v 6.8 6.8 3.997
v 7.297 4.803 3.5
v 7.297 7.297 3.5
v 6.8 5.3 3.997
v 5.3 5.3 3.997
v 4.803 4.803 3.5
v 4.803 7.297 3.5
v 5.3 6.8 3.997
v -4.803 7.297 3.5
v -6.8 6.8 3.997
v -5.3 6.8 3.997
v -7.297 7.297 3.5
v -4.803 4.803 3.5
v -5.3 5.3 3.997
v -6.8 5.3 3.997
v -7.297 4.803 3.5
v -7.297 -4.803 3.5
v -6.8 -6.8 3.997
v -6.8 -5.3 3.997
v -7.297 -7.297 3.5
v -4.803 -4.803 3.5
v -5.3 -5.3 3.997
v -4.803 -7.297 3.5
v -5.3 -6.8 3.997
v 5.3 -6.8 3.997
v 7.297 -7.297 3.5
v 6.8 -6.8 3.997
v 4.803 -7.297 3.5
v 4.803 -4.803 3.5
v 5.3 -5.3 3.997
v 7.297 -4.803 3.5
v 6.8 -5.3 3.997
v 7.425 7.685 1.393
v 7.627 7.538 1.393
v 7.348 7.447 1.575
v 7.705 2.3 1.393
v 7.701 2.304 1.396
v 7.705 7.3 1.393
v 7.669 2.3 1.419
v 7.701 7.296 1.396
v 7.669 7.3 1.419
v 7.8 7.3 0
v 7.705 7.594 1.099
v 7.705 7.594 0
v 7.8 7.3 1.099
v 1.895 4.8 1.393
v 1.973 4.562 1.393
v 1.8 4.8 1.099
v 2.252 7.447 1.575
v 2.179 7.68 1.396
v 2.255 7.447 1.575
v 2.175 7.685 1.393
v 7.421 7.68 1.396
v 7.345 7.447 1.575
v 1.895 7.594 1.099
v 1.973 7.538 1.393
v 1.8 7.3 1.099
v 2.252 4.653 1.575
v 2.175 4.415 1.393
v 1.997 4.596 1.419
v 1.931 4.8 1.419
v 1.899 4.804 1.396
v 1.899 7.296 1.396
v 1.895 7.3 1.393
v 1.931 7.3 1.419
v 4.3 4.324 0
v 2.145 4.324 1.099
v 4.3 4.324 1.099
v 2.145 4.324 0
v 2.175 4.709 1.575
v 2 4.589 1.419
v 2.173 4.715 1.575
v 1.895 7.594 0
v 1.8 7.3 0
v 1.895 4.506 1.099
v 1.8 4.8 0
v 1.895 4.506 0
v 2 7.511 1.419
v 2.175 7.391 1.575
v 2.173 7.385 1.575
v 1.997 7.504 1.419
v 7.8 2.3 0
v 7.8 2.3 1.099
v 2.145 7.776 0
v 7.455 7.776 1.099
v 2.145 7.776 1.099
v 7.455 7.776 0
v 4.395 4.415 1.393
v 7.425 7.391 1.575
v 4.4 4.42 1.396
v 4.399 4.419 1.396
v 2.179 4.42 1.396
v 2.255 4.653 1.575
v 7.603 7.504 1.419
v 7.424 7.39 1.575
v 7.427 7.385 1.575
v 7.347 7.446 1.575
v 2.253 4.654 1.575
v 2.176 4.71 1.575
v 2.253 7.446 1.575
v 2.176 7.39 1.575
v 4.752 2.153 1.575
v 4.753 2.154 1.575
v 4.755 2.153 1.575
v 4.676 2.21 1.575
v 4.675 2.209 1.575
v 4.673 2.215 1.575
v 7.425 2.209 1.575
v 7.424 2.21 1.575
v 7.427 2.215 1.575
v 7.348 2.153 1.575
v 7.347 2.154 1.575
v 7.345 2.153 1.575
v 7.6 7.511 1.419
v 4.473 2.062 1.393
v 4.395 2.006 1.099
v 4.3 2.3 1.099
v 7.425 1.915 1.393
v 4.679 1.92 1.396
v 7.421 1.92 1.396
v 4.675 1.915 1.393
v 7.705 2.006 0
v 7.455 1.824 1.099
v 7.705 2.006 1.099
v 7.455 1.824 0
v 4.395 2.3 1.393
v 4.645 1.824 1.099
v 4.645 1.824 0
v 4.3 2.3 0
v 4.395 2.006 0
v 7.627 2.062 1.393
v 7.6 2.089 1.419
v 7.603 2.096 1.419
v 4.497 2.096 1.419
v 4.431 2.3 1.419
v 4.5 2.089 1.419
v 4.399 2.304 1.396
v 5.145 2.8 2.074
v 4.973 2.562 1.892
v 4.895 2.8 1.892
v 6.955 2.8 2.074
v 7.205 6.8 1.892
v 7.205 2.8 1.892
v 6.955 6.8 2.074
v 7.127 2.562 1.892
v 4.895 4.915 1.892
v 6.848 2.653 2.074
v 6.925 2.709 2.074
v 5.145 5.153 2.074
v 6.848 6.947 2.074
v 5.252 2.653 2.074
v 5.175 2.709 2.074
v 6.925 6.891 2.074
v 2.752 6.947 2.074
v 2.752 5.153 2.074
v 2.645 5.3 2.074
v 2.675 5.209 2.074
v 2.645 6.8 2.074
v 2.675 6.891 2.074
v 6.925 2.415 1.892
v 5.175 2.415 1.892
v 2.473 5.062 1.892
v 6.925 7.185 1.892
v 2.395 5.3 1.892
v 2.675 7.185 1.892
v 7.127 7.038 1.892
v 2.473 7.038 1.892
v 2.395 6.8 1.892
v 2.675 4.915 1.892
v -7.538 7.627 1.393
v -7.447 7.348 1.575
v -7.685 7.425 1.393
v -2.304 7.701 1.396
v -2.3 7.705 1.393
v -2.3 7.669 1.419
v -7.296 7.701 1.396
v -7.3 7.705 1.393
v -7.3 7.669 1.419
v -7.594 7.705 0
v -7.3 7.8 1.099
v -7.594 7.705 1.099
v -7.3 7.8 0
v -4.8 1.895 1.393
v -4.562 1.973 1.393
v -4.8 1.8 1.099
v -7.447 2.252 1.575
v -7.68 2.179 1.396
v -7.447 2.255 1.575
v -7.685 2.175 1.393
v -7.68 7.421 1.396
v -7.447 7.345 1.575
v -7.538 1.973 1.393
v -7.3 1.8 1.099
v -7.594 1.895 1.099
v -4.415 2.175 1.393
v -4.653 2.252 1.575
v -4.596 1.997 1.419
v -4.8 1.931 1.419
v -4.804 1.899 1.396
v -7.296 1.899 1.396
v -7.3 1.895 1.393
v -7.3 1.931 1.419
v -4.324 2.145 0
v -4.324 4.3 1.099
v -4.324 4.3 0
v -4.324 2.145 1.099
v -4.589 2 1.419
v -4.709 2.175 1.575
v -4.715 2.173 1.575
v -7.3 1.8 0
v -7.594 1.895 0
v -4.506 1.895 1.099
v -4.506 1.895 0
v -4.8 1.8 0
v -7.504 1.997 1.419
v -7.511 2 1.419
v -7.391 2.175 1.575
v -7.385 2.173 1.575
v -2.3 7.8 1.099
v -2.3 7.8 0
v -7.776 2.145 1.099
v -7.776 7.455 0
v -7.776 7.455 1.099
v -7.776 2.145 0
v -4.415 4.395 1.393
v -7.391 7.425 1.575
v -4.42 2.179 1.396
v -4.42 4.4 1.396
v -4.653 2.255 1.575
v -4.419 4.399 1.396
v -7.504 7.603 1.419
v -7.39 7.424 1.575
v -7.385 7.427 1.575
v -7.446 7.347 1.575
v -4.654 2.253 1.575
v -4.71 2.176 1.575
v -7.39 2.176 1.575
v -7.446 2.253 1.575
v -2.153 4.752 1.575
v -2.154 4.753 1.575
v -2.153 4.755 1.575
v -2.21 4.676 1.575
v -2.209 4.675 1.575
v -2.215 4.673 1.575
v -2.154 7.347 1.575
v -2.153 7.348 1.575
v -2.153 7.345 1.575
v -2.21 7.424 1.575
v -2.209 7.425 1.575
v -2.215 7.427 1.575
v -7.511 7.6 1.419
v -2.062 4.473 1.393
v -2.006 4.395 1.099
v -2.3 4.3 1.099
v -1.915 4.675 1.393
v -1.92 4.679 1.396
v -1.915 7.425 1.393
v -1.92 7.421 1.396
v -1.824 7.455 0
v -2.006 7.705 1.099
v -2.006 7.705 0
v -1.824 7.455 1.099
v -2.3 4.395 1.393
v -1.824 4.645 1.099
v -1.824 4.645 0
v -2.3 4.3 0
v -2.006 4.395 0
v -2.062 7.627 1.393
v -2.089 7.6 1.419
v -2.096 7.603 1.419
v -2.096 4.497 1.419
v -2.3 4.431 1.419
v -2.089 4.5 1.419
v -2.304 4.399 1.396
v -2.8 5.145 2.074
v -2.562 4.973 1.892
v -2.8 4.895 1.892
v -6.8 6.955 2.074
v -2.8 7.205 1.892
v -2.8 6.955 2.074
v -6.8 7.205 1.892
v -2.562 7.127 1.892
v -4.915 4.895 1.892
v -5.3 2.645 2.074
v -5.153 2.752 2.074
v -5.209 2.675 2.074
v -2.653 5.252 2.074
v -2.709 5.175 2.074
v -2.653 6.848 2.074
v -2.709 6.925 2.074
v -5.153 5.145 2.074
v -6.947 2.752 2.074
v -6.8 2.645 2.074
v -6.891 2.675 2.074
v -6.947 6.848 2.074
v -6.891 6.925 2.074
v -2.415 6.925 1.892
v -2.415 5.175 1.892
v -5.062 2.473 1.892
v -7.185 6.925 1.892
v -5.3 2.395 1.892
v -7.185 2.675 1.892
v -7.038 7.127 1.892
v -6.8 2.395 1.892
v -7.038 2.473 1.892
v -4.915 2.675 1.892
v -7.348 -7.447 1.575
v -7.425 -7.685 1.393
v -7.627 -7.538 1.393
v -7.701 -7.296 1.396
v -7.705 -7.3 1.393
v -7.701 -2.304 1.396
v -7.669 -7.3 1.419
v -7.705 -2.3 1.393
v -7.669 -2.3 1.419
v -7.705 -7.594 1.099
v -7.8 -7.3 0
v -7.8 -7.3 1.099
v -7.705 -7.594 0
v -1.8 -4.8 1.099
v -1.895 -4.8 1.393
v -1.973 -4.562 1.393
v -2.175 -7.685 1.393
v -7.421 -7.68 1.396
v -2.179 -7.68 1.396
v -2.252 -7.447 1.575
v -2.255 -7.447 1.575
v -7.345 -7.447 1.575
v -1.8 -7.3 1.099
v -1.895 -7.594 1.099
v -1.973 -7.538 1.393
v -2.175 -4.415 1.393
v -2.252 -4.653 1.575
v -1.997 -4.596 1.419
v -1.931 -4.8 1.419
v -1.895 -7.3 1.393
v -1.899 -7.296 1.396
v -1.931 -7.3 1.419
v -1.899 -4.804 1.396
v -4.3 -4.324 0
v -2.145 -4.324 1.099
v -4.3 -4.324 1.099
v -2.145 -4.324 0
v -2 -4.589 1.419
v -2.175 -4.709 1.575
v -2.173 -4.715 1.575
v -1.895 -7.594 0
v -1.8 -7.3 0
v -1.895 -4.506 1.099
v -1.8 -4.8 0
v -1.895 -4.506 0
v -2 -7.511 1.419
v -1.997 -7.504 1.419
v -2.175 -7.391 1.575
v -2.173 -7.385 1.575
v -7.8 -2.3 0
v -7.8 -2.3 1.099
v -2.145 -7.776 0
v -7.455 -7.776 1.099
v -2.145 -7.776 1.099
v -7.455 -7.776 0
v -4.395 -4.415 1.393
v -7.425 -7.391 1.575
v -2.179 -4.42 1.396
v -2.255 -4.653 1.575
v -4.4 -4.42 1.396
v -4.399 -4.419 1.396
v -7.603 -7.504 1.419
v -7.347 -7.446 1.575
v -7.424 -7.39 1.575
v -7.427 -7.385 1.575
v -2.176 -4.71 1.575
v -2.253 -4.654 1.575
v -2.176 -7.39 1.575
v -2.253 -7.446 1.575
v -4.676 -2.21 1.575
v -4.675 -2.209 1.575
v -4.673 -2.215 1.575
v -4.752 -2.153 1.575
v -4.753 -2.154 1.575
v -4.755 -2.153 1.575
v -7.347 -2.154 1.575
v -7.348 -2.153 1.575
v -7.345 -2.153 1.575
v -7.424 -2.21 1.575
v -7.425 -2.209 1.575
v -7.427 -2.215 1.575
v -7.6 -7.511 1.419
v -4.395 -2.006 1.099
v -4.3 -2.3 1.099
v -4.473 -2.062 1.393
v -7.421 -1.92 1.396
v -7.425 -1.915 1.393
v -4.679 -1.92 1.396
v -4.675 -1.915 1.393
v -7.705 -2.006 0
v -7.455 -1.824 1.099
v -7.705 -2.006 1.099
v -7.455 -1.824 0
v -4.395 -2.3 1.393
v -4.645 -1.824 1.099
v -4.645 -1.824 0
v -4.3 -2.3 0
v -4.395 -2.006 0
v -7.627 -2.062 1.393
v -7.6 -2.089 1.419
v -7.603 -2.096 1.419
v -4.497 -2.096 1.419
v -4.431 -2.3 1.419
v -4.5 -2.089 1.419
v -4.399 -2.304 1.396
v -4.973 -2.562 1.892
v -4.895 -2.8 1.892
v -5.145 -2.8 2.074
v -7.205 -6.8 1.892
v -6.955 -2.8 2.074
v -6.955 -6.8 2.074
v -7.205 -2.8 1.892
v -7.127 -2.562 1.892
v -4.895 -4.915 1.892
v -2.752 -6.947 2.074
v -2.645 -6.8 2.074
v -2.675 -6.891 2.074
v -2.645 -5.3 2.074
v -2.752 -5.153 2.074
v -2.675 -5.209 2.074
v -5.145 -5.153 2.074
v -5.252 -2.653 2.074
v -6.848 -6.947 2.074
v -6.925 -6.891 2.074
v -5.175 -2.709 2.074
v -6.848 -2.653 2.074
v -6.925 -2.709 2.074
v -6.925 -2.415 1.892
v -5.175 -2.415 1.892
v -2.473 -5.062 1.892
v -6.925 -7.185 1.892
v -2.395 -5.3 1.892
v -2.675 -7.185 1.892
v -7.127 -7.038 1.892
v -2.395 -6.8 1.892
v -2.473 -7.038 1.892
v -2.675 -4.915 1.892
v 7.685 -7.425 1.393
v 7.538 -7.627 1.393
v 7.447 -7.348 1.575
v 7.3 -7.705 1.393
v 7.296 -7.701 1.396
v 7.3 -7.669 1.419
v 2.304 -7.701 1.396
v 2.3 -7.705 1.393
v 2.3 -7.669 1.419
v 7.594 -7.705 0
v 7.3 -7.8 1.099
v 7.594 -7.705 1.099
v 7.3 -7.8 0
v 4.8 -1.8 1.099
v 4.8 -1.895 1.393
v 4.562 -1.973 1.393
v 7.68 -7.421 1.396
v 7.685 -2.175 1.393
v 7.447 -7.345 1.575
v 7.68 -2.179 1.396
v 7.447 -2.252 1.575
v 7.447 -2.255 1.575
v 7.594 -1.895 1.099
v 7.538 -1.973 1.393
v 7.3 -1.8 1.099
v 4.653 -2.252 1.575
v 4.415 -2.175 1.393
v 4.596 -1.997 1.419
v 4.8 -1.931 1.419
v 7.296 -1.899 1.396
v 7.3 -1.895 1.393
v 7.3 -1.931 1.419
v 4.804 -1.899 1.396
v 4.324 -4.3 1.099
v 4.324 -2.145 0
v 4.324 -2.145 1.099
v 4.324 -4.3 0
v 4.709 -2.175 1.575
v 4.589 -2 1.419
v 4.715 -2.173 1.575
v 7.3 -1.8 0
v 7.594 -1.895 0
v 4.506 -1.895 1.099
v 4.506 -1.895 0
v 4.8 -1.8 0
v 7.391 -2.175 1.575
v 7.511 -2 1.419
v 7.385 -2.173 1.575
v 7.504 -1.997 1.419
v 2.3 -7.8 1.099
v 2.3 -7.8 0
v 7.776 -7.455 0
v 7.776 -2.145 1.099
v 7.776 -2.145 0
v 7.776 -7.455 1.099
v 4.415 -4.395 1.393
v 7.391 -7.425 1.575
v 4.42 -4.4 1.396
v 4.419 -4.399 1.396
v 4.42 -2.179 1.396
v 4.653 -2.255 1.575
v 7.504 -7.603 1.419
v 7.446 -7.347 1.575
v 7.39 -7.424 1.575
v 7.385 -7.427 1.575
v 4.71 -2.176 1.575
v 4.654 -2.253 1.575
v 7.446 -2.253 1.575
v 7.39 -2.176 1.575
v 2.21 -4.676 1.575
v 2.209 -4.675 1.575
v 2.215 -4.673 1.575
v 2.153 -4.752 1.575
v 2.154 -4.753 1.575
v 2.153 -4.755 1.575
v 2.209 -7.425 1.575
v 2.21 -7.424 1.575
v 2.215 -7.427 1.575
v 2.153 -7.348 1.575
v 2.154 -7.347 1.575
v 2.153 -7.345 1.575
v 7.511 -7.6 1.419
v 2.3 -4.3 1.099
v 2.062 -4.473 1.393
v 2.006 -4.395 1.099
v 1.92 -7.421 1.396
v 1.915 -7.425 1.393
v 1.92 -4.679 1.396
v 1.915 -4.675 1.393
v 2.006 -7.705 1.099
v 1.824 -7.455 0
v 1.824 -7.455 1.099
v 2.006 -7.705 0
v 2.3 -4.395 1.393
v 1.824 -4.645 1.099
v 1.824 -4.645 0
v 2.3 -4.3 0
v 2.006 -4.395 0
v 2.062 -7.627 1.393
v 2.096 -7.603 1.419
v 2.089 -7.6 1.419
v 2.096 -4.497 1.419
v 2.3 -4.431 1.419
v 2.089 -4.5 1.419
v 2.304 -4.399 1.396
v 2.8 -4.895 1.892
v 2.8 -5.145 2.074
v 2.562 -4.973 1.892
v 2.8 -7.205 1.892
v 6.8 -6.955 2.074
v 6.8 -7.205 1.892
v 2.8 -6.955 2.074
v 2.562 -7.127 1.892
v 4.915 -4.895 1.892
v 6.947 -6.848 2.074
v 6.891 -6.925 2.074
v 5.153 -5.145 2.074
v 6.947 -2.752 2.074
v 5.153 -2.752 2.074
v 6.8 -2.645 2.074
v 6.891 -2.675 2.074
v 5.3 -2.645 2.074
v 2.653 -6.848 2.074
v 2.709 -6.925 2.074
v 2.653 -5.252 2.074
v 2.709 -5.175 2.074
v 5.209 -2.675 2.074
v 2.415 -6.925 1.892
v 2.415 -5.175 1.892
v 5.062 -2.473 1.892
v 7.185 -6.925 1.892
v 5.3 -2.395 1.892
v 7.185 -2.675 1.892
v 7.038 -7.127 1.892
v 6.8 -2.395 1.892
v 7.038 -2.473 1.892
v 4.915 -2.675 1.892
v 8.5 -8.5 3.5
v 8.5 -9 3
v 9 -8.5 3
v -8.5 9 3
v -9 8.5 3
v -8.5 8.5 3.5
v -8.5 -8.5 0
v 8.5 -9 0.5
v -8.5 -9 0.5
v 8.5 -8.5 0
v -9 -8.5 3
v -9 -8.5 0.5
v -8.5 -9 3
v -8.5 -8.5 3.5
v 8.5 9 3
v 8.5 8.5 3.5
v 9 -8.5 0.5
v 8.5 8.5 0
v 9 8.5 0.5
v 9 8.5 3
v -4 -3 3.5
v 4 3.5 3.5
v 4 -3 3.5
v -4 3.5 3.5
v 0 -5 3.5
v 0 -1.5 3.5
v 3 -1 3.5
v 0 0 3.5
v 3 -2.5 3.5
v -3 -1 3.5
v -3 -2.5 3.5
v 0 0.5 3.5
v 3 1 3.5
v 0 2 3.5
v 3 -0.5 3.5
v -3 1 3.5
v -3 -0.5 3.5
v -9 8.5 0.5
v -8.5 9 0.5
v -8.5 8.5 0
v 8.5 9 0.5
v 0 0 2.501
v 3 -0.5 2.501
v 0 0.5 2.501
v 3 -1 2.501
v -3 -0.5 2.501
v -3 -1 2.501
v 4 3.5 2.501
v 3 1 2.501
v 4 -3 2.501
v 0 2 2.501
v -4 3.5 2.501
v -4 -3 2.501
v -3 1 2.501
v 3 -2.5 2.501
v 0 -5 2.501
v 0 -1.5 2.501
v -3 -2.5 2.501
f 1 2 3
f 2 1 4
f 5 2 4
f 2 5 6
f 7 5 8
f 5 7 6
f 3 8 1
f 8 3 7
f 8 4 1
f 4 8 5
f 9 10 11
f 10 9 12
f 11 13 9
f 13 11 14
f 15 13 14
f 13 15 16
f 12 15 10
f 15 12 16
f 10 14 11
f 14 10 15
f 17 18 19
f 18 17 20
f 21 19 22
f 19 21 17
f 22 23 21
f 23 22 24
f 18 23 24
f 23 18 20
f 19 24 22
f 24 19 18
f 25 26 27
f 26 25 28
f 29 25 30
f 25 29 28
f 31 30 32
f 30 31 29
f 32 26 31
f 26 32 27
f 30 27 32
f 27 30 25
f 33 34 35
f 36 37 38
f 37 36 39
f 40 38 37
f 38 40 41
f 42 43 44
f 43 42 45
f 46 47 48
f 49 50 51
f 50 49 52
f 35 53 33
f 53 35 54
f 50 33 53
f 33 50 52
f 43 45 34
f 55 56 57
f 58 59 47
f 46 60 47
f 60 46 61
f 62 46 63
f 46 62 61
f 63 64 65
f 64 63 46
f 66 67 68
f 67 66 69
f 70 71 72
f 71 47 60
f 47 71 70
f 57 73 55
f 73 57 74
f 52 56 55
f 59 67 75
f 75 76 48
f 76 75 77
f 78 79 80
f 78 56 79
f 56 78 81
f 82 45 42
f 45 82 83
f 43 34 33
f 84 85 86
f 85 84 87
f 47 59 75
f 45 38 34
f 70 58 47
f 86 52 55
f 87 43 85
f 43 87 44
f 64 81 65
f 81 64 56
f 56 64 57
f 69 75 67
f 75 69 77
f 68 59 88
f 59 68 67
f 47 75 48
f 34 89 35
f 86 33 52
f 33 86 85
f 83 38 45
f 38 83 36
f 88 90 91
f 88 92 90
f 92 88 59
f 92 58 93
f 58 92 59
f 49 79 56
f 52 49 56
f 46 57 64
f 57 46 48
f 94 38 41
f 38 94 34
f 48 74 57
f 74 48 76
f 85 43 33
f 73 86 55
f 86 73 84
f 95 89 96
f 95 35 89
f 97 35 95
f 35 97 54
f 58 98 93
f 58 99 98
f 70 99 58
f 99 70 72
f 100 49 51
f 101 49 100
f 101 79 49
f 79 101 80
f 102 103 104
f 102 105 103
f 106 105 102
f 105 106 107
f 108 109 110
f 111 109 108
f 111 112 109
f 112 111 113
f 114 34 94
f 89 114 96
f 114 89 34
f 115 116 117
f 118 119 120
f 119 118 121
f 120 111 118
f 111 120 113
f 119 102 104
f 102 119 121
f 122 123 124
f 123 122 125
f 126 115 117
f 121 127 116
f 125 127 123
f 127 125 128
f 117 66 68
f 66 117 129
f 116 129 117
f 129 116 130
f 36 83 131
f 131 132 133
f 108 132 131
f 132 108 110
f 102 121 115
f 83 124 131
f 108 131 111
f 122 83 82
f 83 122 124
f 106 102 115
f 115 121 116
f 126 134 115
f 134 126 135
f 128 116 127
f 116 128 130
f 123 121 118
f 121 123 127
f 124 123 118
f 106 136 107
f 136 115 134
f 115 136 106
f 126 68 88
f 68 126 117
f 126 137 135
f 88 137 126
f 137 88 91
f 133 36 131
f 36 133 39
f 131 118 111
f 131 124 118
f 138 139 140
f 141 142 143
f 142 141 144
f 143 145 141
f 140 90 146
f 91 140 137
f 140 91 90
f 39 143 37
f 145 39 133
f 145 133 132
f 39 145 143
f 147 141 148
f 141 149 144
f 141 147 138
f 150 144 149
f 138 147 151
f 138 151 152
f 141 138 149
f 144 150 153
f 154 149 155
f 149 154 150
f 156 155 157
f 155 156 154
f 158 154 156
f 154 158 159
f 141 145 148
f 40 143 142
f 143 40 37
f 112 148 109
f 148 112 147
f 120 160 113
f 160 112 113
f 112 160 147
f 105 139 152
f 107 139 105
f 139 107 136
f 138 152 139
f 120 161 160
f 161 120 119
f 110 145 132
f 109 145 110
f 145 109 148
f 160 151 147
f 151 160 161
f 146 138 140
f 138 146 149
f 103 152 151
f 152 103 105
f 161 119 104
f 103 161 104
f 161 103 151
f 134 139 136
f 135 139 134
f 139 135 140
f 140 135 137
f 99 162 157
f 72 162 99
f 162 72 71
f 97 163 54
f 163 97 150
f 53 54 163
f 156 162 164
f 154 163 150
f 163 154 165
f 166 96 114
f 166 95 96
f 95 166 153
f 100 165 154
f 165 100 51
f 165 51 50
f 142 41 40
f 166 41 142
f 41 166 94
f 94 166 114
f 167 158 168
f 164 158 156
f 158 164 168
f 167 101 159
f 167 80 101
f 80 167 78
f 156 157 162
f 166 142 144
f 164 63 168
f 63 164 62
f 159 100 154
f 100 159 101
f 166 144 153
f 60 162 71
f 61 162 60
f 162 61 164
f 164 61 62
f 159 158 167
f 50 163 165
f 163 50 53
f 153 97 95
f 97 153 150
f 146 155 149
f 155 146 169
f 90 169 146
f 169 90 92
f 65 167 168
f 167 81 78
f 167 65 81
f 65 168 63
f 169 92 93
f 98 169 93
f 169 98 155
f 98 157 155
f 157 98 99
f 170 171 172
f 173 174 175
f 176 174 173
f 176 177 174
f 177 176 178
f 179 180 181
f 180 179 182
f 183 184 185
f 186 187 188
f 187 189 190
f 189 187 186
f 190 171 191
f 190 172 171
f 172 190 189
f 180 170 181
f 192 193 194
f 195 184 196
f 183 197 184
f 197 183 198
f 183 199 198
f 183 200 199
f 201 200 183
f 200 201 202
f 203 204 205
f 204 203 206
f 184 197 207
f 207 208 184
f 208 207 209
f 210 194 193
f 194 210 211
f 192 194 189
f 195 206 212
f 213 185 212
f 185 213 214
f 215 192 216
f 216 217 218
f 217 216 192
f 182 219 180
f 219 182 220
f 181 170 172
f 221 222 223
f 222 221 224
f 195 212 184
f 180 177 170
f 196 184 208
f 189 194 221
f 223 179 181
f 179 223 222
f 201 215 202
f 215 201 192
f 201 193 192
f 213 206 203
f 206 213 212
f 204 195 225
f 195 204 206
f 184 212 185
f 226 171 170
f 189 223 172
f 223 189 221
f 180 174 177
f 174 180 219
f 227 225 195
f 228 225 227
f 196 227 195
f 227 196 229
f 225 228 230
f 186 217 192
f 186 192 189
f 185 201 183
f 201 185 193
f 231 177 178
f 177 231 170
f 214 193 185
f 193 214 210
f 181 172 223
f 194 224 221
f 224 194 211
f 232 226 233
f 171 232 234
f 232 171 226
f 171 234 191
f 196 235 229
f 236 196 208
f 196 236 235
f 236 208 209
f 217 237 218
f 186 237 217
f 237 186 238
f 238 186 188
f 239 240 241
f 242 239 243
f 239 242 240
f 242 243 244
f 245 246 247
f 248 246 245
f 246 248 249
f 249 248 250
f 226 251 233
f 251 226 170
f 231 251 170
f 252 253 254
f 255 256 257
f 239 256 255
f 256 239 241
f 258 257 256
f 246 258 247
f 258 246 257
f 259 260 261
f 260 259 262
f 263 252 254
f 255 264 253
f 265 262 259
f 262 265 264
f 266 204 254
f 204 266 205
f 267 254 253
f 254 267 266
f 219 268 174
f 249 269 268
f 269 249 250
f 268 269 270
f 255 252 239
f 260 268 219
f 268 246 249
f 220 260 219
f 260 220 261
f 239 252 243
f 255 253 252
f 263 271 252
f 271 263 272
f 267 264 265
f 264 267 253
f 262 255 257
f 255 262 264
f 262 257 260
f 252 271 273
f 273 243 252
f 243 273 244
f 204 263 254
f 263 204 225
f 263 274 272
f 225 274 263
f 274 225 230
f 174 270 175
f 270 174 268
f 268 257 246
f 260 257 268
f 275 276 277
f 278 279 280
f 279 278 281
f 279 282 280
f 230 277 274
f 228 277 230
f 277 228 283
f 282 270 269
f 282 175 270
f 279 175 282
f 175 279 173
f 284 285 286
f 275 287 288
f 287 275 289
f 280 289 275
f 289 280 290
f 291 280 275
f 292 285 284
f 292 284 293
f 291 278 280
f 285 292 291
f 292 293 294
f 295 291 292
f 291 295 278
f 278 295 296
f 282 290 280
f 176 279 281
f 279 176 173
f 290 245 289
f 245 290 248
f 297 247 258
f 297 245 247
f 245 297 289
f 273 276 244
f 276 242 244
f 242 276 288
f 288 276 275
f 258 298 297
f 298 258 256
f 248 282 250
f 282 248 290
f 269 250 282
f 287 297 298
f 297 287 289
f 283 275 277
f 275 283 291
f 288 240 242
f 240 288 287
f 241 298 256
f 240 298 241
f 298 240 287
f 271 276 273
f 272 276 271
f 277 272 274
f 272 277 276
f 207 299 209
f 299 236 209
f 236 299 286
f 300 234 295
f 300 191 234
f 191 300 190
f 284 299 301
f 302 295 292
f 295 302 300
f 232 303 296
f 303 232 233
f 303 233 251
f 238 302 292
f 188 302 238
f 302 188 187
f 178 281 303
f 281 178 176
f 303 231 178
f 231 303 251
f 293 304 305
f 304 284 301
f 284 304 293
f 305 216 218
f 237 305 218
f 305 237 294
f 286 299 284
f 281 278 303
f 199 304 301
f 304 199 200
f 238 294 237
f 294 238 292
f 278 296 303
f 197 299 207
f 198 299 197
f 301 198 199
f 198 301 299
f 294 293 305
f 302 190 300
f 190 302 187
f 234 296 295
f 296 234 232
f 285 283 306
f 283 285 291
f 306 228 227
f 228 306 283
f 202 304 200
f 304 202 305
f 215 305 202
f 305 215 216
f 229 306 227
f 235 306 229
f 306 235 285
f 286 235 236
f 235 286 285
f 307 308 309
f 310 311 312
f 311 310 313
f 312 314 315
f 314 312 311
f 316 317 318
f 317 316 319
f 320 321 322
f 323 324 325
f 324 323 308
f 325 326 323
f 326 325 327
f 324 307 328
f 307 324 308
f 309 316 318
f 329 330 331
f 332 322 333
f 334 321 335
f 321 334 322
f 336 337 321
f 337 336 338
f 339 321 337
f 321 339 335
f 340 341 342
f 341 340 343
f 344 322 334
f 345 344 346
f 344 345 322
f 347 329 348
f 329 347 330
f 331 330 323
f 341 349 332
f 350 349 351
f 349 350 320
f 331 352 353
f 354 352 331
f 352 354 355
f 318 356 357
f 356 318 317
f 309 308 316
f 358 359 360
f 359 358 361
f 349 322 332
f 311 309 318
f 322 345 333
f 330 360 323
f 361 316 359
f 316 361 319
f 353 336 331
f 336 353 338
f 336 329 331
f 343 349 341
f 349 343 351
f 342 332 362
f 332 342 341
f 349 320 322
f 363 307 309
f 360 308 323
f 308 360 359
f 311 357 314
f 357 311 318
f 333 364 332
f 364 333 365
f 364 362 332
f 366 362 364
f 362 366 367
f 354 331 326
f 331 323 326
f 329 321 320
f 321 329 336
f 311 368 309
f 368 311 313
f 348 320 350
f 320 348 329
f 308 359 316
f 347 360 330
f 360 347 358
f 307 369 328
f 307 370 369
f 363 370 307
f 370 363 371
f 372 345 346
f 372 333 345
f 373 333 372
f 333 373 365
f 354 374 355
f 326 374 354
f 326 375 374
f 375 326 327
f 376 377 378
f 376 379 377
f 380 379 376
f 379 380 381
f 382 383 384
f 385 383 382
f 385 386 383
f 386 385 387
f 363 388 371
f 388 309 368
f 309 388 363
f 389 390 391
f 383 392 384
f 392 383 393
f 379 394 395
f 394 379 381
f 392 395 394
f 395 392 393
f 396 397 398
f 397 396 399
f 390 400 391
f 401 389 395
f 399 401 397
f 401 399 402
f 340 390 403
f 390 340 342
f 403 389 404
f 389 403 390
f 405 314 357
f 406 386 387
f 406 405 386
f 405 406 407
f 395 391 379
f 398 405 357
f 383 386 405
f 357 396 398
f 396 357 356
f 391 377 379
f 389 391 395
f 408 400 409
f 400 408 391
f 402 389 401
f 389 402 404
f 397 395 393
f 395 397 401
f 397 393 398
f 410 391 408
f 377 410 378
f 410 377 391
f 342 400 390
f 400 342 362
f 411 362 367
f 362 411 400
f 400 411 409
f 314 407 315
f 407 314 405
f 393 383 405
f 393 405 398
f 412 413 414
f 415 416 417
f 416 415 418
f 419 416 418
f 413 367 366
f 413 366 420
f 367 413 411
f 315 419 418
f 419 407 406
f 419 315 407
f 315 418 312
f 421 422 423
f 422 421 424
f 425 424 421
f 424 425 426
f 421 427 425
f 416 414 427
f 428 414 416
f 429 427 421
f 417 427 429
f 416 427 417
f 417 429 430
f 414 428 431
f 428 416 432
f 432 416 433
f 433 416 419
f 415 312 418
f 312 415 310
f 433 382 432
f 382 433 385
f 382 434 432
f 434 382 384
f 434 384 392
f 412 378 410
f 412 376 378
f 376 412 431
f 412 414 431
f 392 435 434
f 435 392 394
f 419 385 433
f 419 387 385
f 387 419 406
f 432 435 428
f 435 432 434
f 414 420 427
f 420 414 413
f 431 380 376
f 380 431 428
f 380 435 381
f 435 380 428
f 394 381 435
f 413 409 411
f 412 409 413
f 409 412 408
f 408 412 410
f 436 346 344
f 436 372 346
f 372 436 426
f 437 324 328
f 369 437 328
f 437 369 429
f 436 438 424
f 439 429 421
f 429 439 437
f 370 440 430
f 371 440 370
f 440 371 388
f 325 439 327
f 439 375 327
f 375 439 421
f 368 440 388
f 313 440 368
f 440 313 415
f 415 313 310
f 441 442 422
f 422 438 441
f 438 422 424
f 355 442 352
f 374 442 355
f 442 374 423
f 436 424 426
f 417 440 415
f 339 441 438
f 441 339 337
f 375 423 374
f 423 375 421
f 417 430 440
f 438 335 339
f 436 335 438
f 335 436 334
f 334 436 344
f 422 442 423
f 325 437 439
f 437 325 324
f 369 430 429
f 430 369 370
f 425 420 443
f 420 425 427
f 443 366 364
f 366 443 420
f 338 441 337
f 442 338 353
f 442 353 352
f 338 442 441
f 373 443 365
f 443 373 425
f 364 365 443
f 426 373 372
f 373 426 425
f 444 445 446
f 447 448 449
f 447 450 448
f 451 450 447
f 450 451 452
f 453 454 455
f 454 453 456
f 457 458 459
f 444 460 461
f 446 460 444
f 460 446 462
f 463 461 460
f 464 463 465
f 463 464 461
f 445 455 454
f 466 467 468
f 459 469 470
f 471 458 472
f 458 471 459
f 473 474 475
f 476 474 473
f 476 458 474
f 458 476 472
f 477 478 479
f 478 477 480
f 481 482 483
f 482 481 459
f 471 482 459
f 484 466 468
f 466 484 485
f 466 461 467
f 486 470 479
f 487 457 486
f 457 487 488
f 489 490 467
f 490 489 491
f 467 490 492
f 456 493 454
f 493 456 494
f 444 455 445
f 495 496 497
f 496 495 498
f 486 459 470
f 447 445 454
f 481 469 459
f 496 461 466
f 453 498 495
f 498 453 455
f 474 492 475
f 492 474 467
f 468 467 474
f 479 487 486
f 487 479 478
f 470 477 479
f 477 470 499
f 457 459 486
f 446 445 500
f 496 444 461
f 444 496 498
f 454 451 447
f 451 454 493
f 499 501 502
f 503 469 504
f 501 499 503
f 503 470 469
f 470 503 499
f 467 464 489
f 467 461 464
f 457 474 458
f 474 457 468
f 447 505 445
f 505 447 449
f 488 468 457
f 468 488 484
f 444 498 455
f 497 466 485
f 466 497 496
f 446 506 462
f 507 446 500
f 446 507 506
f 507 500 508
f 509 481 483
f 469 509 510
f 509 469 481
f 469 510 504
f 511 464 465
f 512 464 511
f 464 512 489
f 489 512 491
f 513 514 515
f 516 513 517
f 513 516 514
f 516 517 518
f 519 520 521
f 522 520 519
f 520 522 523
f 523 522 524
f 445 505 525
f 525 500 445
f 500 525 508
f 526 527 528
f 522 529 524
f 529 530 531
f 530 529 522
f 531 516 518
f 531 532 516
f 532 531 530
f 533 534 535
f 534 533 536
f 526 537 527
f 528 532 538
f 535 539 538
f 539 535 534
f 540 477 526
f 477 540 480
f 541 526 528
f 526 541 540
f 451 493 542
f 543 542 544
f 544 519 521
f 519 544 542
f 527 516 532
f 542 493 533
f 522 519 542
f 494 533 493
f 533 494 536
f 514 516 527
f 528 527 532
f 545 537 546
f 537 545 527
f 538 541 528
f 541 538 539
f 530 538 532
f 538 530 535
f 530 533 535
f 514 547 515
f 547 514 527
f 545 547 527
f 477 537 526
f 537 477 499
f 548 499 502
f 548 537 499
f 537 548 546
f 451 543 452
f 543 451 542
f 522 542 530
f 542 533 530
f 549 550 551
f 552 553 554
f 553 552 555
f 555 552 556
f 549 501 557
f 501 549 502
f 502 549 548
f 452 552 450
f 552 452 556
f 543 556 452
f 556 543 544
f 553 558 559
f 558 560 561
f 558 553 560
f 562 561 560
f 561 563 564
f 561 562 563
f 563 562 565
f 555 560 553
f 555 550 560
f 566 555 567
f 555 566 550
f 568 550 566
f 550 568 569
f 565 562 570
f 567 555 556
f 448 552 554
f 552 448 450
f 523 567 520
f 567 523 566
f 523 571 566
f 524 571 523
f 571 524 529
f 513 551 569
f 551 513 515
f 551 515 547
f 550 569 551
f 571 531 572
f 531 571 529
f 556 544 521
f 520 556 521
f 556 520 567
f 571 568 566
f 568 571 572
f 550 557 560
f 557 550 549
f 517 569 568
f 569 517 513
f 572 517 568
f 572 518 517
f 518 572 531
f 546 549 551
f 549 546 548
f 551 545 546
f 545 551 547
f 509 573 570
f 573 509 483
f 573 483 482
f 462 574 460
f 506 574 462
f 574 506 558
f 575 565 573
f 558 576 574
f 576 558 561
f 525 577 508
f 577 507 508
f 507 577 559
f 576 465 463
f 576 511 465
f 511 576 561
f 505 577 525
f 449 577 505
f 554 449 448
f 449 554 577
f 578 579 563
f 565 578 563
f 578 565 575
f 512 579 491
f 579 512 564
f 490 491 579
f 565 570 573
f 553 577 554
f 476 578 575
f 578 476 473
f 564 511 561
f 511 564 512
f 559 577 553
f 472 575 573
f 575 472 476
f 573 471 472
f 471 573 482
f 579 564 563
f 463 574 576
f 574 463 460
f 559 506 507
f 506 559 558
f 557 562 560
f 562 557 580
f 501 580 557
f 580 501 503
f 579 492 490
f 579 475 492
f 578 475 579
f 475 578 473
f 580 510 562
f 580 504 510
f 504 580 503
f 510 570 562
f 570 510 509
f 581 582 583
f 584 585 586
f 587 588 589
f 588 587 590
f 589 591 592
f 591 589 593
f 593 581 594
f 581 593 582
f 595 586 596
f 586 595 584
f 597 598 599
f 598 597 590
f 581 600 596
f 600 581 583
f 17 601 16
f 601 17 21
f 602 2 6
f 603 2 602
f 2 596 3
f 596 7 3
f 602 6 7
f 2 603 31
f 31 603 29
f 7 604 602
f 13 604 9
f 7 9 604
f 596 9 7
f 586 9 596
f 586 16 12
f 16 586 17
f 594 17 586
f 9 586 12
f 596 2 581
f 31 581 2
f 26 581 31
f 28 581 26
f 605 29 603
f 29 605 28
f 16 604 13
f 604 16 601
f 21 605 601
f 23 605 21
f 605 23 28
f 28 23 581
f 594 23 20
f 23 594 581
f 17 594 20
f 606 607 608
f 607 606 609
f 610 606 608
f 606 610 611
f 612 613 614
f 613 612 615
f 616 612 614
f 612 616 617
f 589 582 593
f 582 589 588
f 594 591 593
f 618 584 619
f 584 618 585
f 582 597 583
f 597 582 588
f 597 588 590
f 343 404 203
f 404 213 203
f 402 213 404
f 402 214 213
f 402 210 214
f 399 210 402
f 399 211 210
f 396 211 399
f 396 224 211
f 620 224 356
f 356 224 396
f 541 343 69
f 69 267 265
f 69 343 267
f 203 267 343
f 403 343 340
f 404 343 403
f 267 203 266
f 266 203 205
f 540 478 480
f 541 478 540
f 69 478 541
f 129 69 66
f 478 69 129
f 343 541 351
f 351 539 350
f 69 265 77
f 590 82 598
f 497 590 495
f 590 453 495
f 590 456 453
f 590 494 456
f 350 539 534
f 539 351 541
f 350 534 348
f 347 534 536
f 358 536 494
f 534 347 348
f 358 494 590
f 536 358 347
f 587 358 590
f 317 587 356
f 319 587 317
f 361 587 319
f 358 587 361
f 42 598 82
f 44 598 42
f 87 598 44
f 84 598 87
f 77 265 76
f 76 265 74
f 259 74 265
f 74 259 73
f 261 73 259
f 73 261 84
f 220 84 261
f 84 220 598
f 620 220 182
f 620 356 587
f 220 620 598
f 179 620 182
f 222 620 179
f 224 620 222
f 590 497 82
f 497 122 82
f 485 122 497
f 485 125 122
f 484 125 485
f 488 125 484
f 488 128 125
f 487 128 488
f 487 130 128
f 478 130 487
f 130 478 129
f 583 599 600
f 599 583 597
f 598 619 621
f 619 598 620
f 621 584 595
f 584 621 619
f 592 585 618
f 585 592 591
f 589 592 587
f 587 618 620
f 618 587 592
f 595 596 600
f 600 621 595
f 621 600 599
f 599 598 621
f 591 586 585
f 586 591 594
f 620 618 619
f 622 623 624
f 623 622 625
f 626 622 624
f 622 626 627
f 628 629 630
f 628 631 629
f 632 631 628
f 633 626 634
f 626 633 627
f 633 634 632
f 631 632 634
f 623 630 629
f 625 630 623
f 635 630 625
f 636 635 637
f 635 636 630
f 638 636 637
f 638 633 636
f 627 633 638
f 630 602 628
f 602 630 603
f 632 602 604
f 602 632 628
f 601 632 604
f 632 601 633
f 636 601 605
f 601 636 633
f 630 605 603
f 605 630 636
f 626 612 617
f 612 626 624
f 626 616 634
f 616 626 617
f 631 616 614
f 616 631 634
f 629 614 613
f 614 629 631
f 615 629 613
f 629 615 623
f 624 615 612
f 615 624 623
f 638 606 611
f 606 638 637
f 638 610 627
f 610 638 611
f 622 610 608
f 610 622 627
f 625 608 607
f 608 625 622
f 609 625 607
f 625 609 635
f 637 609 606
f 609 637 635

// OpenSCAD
// file: head.scad
include <common.scad>

// Studs are 1.6mm high and 2.5mm across.
stud_width = 2.5;

// Studs are spaced 1.7mm in from the edges of an 18x18mm
// square.
stud_inset = 1.7;

// 45 degree beveled top, 0.5mm high.
module stud_top(dims) {
  hull() {
    for (a = [-1, 1], b = [-1, 1]) {
      translate([
        a*(dims.x/2-0.5), b*(dims.y/2-0.5), 0
      ]) {
        pyramid();
      }
    }
  }
}

module stud_piece(dims, column_height) {
  assert(dims.x >= 1);
  assert(dims.y >= 1);
  
  // Rectangular column.
  translate([0, 0, -eps])
    linear_extrude(column_height)
      square(dims, center=true);
  
  // Beveled top.
  translate([0, 0, column_height-2*eps])
    stud_top(dims);
  
  // Beveled bottom, in case any material under the stud
  // is etched away (by the face mask, for instance).
  scale([1, 1, -1])
    stud_top(dims);
}

NO_STUD = 0;
SMALL_STUD = 1;
SMALL_SHORT_STUD = 2;
LARGE_STUD = 3;
LARGE_SHORT_STUD = 4;

module stud(type=NO_STUD) {
  if (type == NO_STUD) {
    // Nothing.
    
  } else if (type == SMALL_STUD ||
             type == SMALL_SHORT_STUD) {
    c = type == SMALL_STUD ? 1.1 : 0;
    stud_piece([stud_width, stud_width], c);
    
  } else if (type == LARGE_STUD ||
             type == LARGE_SHORT_STUD) {
    c = type == LARGE_STUD ? 1.1 : 0;

    // Build an L-shaped stud out of two elongated pieces.
    translate([0, -stud_width/2, 0])
      stud_piece([stud_width, stud_width*2], c);
    translate([-stud_width/2, 0, 0])
      stud_piece([stud_width*2, stud_width], c);
    
  } else {
    assert(false, "bad stud type");
  }
}

module four_studs() {
  displacement = (18/2)-(stud_width/2)-stud_inset;  
  for (a = [0:3])
    rotate([0, 0, a*90])
      translate([displacement, displacement, 0])
        children();
}

// A stackable box, 18x18mm, with optional studs and holes.
module stackable_box(
  height, stud_type=NO_STUD, hole_type=NO_STUD
) {
  translate([0, 0, height - eps]) {
    four_studs()
      stud(stud_type);
  }

  difference() {
    chamfered_box([18, 18, height]);
    
    if (hole_type != NO_STUD) {
      four_studs() {
        // This check is required because minkowski() returns
        // a nonempty result if just one of its arguments is
        // empty.
        minkowski() {
          stud(hole_type);
          sphere(r=0.5, $fn=10);
        }
      }
    }
  }
}

// A head, which is intended to have 2 chips stacked on top.
module head(face_raster, tall=false) {
  difference() {
    // A 10mm head plus two 3.5mm chips comes to 17mm,
    // which is slightly less than the 18mm width. That's
    // by design. It looks better not to have such tall 
    // heads, perhaps because the studs on top give the
    // illusion of added height.
    chamfered_box([18, 18, tall ? 12 : 10]);
    
    // Bring the mask out a bit extra to avoid having it 
    // intersect the studs at all.
    translate([0, -9, 0])
      face(face_raster);
    
    // A socket for gluing to a body.
    locking_socket_bottom();
  }
  
  // Add the studs separately, so they are not gouged by
  // the face engraving.
  translate([0, 0, (tall ? 12 : 10) - eps]) {
    four_studs()
      stud(SMALL_STUD);
  }
}

// 'raster' is an array of 5 rows, where each row has 8
// elements. Each element should be in [0, 1]. A '1' means the
// given position will be fully engraved on the face.
// Returns a mask which should be subtracted from the head.
// The Z axis will coincide with the centerline of the 
// mask's front.
module face(raster) {
  // Below we use a unit of 1 to represent one pixel on
  // the face. Scale up to an 18mm face, 8 pixels wide.
  scale([2.25, 2.25, 2.25]) {
    translate([-4, -eps, -eps]) {
      difference() {
        // Begin with a filled-in face plate.
        translate([-eps, -eps, -eps])
          cube([8+2*eps, 0.9+2*eps, 5+2*eps]);
        
        // Subtract the material which needs to remain on the
        // head. Leave some support under each shelf.
        for (r = [0:4])
          for (c = [0:7])
            translate([c-eps, raster[r][c]-eps, 4-r-eps])
              rotate([90, 0, 90])
                translate([0, 0, -2*eps])
                  linear_extrude(1+4*eps)
                    polygon([
                      [   -2*eps,     -2*eps],
                      [0.9+2*eps, -0.5-2*eps],
                      [0.9+2*eps,    1+2*eps],
                      [   -2*eps,    1+2*eps],
                    ]);
      }
    }
  }
}

module creeper_head() {
  head([
    [0, 1, 1, 0, 0, 1, 1, 0],
    [0, 1, 1, 0, 0, 1, 1, 0],
    [0, 0, 0, 1, 1, 0, 0, 0],
    [0, 0, 1, 1, 1, 1, 0, 0],
    [0, 0, 1, 0, 0, 1, 0, 0],
  ]);
}

module zombie_head() {
  head([
    [0.0, 0.0, 0.0, 0.0, 0.0, 0.0, 0.0, 0.0],
    [0.0, 1.0, 1.0, 0.0, 0.0, 1.0, 1.0, 0.0],
    [0.0, 0.0, 0.0, 0.8, 0.8, 0.0, 0.0, 0.0],
    [0.0, 0.0, 0.2, 0.2, 0.2, 0.2, 0.0, 0.0],
    [0.0, 0.0, 0.2, 0.2, 0.2, 0.2, 0.0, 0.0],
  ]);
}

module skeleton_head() {
  head([
    [0, 0, 0, 0, 0, 0, 0, 0],
    [0, 1, 1, 0, 0, 1, 1, 0],
    [0, 0, 0, 1, 1, 0, 0, 0],
    [0, 1, 1, 1, 1, 1, 1, 0],
    [0, 0, 0, 0, 0, 0, 0, 0],
  ]);
}

module spider_head() {
  head([
    [1, 0, 0, 0, 0, 0, 0, 1],
    [1, 0, 1, 1, 1, 1, 0, 1],
    [0, 0, 1, 1, 1, 1, 0, 0],
    [0, 0, 0, 0, 0, 0, 0, 0],
    [0, 0, 1, 0, 0, 1, 0, 0],
  ]);
}

module hero_head() {
  head([
    [0, 0, 0, 0, 0, 0, 0, 0],
    [0, 0.7, 1, 0, 0, 1, 0.7, 0],
    [0, 0, 0, 0.8, 0.8, 0, 0, 0],
    [0, 0, 1, 0, 0, 1, 0, 0],
    [0, 0, 1, 1, 1, 1, 0, 0],
  ]);
}

module enderman_head() {
  head([
    [0, 0, 0, 0, 0, 0, 0, 0],
    [1, 1, 1, 0, 0, 1, 1, 1],
    [0, 0, 0, 0, 0, 0, 0, 0],
    [0, 0, 0, 0, 0, 0, 0, 0],
    [0, 0, 0, 0, 0, 0, 0, 0],
  ]);
}

module evoker_head() {
  head([
    [0, 0, 0, 0, 0, 0, 0, 0],
    [0, 0.7, 1, 0, 0, 1, 0.7, 0],
    [0, 0, 0, 0, 0, 0, 0, 0],
    [0, 0, 0.4, 0, 0, 0.4, 0, 0],
    [0, 0, 0.4, 0, 0, 0.4, 0, 0],
  ], tall=true);
  
  // Nose.
  translate([0, -9.5, 0])
    chamfered_box([4.5, 4, 6]);
  
  // Eyebrows.
  difference() {
    translate([-8.5, -9+eps, 9])
      rotate([90, 0, 0])
        rotate([0, 90, 0])
          linear_extrude(17)
            polygon([
              [0, 0],
              [-1.3, 1],
              [-1, 2.5],
              [1, 3],
            ]);
    
    // Cut out a space between the two eyebrows.
    cube([4.5, 100, 100], center=true);
  }
}

// Heavy armor cannot stack on a heavy weapon.
module light_weapon() {
  stackable_box(3.5, SMALL_STUD, SMALL_STUD);
}
module heavy_weapon() {
  stackable_box(3.5, LARGE_STUD, SMALL_STUD);
}
module light_armor() {
  stackable_box(3.5, SMALL_SHORT_STUD, LARGE_STUD);
}
module heavy_armor() {
  stackable_box(3.5, LARGE_SHORT_STUD, SMALL_STUD);
}

// Status effect chips go between the weapon and head.
// So their top and bottom match the head's top.
module status_effect() {
  stackable_box(3.5, SMALL_STUD, SMALL_STUD);
}
// file: common.scad
// Unless otherwise specified, each resulting shape is
// resting on the XY plane, centered on the Z axis.

// A small amount to make sure shapes overlap when needed. This
// is well below the resolution of my 3D printer, so it
// shouldn't affect the final result.
eps = 0.001;

// High quality for printing.
$fa = 5;
$fs = 0.4;

module repeatx(n, spacing) {
  for (i = [1:n])
    translate([(i-1)*spacing, 0, 0])
      children();
}

module repeaty(n, spacing) {
  for (i = [1:n])
    translate([0, (i-1)*spacing, 0])
      children();
}

// A square pyramid, 1mm wide and 0.5mm tall. Each side of
// the base is centered on an axis.
module pyramid() {
  linear_extrude(0.5, scale=0)
    square(1, center=true);
}

// A regular octahedron centered on the origin with its
// vertices on the axes. 'axis' gives its full length along
// each axis.
module octahedron(axis) {
  // Top and bottom halves.
  for (a = [-1, 1])
    scale([1, 1, a])
      // Extrude a square into a pyramid.
      linear_extrude(axis/2, scale=0)
        rotate([0, 0, 45])
          square(norm([axis/2, axis/2]), center=true);
}

// 'd' is the outer dimensions of the box.
module chamfered_box(d, chamfer=0.5) {
  assert(d.x >= chamfer*2);
  assert(d.y >= chamfer*2);
  assert(d.z >= chamfer*2);

  // Raise the result up so it is resting on the XY plane.
  translate([0, 0, d.z/2]) {
    minkowski() {
      // The desired cube, scaled back by the chamfer distance
      // in all directions.
      cube(d - [chamfer*2, chamfer*2, chamfer*2], center=true);
      octahedron(chamfer*2);
    }
  }
}

module chamfered_disk(height, radius) {
  // Chamfer base disks and chips more aggressively.
  chamfer = 1.1;
  assert(radius >= chamfer);
  assert(height >= chamfer*2);

  // Raise the result up so it is resting on the XY plane.
  translate([0, 0, height/2]) {
    minkowski() {
      // The desired disk, scaled back by the chamfer distance
      // in all directions.
      cylinder(height-chamfer*2, r=radius-chamfer, center=true);
      
      // A pair of cones.
      for (a = [-1, 1])
        scale([1, 1, a])
          linear_extrude(chamfer, scale=0)
            circle(chamfer);
    }
  }
}

locking_lug_dims = [2.3, 2.3, 1.8+2*eps];

// A snug fit for gluing.
module locking_lug() {
  // Taper the lug slightly, to counteract the printing effect
  // which spreads the top layer slightly.
  linear_extrude(locking_lug_dims.z, scale=0.95)
    square([locking_lug_dims.x, locking_lug_dims.y],
            center=true);
}

// Make extra sure the lug will fit all the way into the hole.
locking_socket_extra_depth = 0.7;

module locking_socket_top() {
  extra_depth = 0.15;
  translate([
    0, 0,
    -(
       locking_lug_dims.z+locking_socket_extra_depth+extra_depth
    )/2+eps
  ]) {
    cube(locking_lug_dims + [
      0.15, 0.15,
      locking_socket_extra_depth+extra_depth
    ], center=true);
  }
}

module locking_socket_bottom() {
  translate([
    0, 0,
    (locking_lug_dims.z+locking_socket_extra_depth)/2-eps
  ]) {
    cube(locking_lug_dims + [
      // When printing this on the bottom of a model, it
      // needs to be a bit wider to account for
      // elephant-foot.
      0.3, 0.3,
      locking_socket_extra_depth
    ], center=true);
  }
}

// A pin which can be used to join two locking sockets.
module locking_pin() {
  dims = [
    locking_lug_dims.x-0.2,
    // Lay the pin on its side for more reliable printing.
    locking_lug_dims.z*2 + locking_socket_extra_depth/2,
    locking_lug_dims.y-0.2,
  ];
  translate([0, 0, dims.z/2]) {
    difference() {
      cube(dims, center=true);
      
      // A slight bottom chamfer to combat elephant-foot.
      for (a = [-1, 1])
        scale([a, 1, 1])
          translate([dims.x/2, -eps, -dims.z/2-1.3])
            rotate([0, 45, 0])
              cube([dims.x, dims.y+3*eps, dims.z], center=true);
    }
  }
}

// Arranges children in square pattern.
module arrange(spacing) {
  s = ceil(sqrt($children));
  for (a = [0:s-1], b = [0:s-1]) {
    c = a + b*s;
    x = a - s/2 + 0.5;
    y = b - s/2 + 0.5;
    if (c < $children)
      translate([x*spacing, y*spacing, 0])
        children(c);
  }
}
// main file
include <common.scad>
use <head.scad>

// Utilities for 1mm-deep graphic or text engravings. 
// Note that dice.scad has its own engraving library
// for dice.

// The clear area in the middle of chip is about 9.6mm 
// on a side.

module sword_2(circ=false) {  
  // Blade and hilt.
  polygon([
    [0.5, -5.5],
    [0.5, 5.5],
    [0, 7.5],
    [-0.5, 5.5],
    [-0.5, -5.5],
  ]);
  
  if (circ) {
    // Rounded pommel.
    translate([0, -5.5, 0]) 
      circle(r = 0.7);
  } else {
    // Square pommel.
    translate([0, -5.5, 0]) 
      rotate([0, 0, 45])
        square(1.3, center=true);
  }
  
  // Crossguard.
  polygon([
    [-2, -2],
    [-2, -3],
    [2, -3],
    [2, -2],
  ]);
  for (a = [-1, 1])
    scale([a, 1, 1])
      translate([2, -2.5, 0])
        circle(r=0.5);
  
  if (circ) {
    // A magic circle around the sword.
    difference() {
      circle(4.5);
      circle(4);
    }
  }
}

module helm_2(circ=false) {
  // Center the whole thing.
  translate([0, circ ? 0 : 0.25, 0]) {
    difference() {
      if (circ) {
        circle(4);
      } else {
        translate([0, -0.5, 0])
          square([8, 7], center=true);
      }
      intersection() {
        if (circ) {
          circle(3.3);
        } else {
          square(6.6, center=true);
        }
        translate([0, 1, 0])
          square([10, 1.5], center=true);
      }
      translate([0, -3, 0])
        square([2, 8], center=true);
    }
  }
}

// First child is the chip. Remaining children are
// the 2-D engravings.
module engrave_chip() {
  if ($flat) {    
    if ($children > 1) {
      children([1:$children-1]);
    }

    // Include the stud pattern as a cue for heavy/light.
    offset(r=-0.2)
      projection(cut=true)
        translate([0, 0, -3.501])
          children(0);
    
    // Add a border.
    difference() {
      square(19, center=true);
      square(17, center=true);
    }

  } else {
    difference() {
      children(0);
      if ($children > 1)
        translate([0, 0, 2.5+eps])
          linear_extrude(1)
            children([1:$children-1]);
    }
  }
}

module magic_sword() {
  engrave_chip() {
    heavy_weapon();
    sword_2(circ=true);
  }
}

module iron_sword() {
  engrave_chip() {
    light_weapon();
    sword_2();
  }
}

module magic_helm() {
  engrave_chip() {
    heavy_armor();
    helm_2(circ=true);
  }
}

module iron_helm() {
  engrave_chip() {
    light_armor();
    helm_2(circ=false);
  }
}

module iron_shield() {
  engrave_chip() {
    light_armor();

    difference() {
      polygon([
        [-4, -3],
        [-4, 3.5],
        [4, 3.5],
        [4, -3],
        [0, -5],
      ]);
      
      // Chevrons.
      for (a = [-1, 1])
        translate([0, a, 0])
          polygon([
            [-3, -1.5],
            [-3, 0],
            [0, 1],
            [3, 0],
            [3, -1.5],
            [0, -0.5],
          ]);
    }
  }
}

module iron_mail() {
  engrave_chip() {
    light_armor();

    for (a = [-2, 0, 2], b = [-1, 1]) {
      translate(2*[a, b, 0]) {
        rotate([0, 0, 45]) {
          difference() {
            square(4, center=true);
            square(2.5, center=true);
          }
        }
      }
    }
  }
}

module wall() {
  engrave_chip() {
    light_armor();

    translate([3.5, 0]) square([5, 1.5], center=true);
    translate([-3.5, 0]) square([5, 1.5], center=true);
    translate([0, 3]) square([5, 1.5], center=true);
    translate([0, -3]) square([5, 1.5], center=true);
  }
}

module fire() {
  engrave_chip() {
    heavy_armor();

    difference() {
      union() {
        circle(r=3);
        translate([0.3, 3, 0]) {
          circle(r=1);
          polygon([[-0.9, 0.4], [0.9, 0.4], [0, 3]]);
        }
      }
      // Cut-out flames.
      translate([-1, -0.5, 0]) {
        circle(r=1);
        polygon([[-0.9, 0.4], [0.9, 0.4], [0, 5]]);
      }
      translate([1.5, 0.5, 0]) {
        circle(r=1);
        polygon([[-0.9, 0.4], [0.9, 0.4], [0, 3]]);
      }
    }
    
    // A ring around everything.
    difference() {
      circle(4.5);
      circle(4);
      offset(0.7)
        translate([0.3, 3, 0])
          polygon([[-0.9, 0.4], [0.9, 0.4], [0, 3]]);
    }
  }
}

module jump_back() {
  engrave_chip() {
    heavy_armor();

    translate([0, 4.6, 0])
      projection()
        rotate([50, 0, 0])
          rotate([0, 0, -20])
            linear_extrude(12, twist=3*360-40)
              translate([2.7, 0, 0])
                circle(0.4);
  }
}

module ender_pearl() {
  engrave_chip() {
    heavy_weapon();
    
    difference() {
      circle(4.5);
      circle(4);
    }
    scale([1.1, 0.6, 1]) {
      difference() {
        circle(3);
        circle(2.2);
      }
    }
  }
}

module health_potion() {
  engrave_chip() {
    heavy_weapon();
    
    difference() {
      square([8, 8], center=true);
      square([7, 2.4], center=true);
      square([2.4, 7], center=true);
      for (a = [-1, 1], b = [-1, 1])
        scale([a, b, 1])
          translate([6.9, 6.9, 0])
            rotate([0, 0, 45])
              square(10, center=true);
    }
  }
}

module hammer() {
  engrave_chip() {
    heavy_weapon();
    
    rotate([0, 0, 10]) {
      translate([0, -1, 0]) square([1.5, 8], center=true);
      translate([0, 2, 0]) square([6, 2], center=true);
      translate([-2.5, 2, 0]) square([1, 3], center=true);
    }
  }
}

module trident() {
  engrave_chip() {
    light_weapon();
    
    translate([0, -2, 0]) square([1, 9], center=true);
    translate([0, 0.5, 0]) {
      difference() {
        circle(3);
        circle(2);
        translate([0, 2, 0]) square([10, 4], center=true);
      }
    }
    for (a = [0:1])
      translate([5*(a-0.5), 1.5, 0])
        square([1, 2], center=true);
    for (a = [0:2])
      translate([2.5*(a-1), 2.5, 0])
        polygon([
          [-1, 0],
          [0, 2],
          [1, 0],
        ]);
  }
}

module lightning() {
  engrave_chip() {
    light_weapon();
    
    translate([0, -1, 0]) {
      for (a = [0:2])
        translate([a-2, -a*3, 0])
          polygon([
            [0, 0],
            [0, 6],
            [3-a/2, 6],
          ]);
      for (a = [0:1])
        translate([a-1.5, -a*3+1.5, 0])
          polygon([
            [-0.5, -1.5],
            [-0.5, 1.5],
            [0.5, 1.5],
            [0.5, -1]
          ]);
    }
  }
}

module wind() {
  engrave_chip() {
    light_weapon();
    
    for (a = [-1, 1]) {
      scale([1, a, 1]) {
        translate([0, 3.3, 0]) {
          hull() {
            translate([0, -2.5, 0]) {
              translate([a, 0, 0]) circle(0.3);
              translate([6, 0, 0]) circle(0.3);
            }
          }
          
          translate([a, 0, 0])
            // Give the coil some actual width.
            offset(r=0.3)
              // Project the coil to make a spiral.
              projection()
                difference()
                  // A tapered coil in 3D.
                  linear_extrude(10, scale=0.4, twist=400)
                    translate([0, -2.5, 0])
                      // This coil is very narrow. We just need
                      // a line to feed to offset().
                      circle(0.01);
        }
      }
    }
  }
}

module blank_weapon() {
  engrave_chip() {
    light_weapon();
  }
}

module blank_armor() {
  engrave_chip() {
    light_armor();
  }
}

if (printout == 1) {
  arrange(25) {
    // Heavy weapons.
    magic_sword();
    ender_pearl();
    hammer();
    health_potion();
   
    // Light weapons.
    iron_sword();
    trident();
    lightning();
    wind();

    // Heavy armor.
    magic_helm();
    fire();
    jump_back();

    // Light armor.
    iron_helm();
    iron_shield();
    iron_mail();
    wall();
  }
}

if (printout == 2) {
  arrange(25) {
    blank_weapon();
    blank_weapon();
    blank_weapon();
    blank_weapon();
    blank_weapon();
    blank_weapon();
    blank_weapon();
    blank_weapon();
    blank_weapon();
    blank_weapon();
  }
}

if (printout == 3) {
  arrange(25) {
    blank_armor();
    blank_armor();
    blank_armor();
    blank_armor();
    blank_armor();
    blank_armor();
    blank_armor();
    blank_armor();
    blank_armor();
    blank_armor();
  }
}

// For use by head_chip_pngs.sh.
if (printout == 4) magic_sword();
if (printout == 5) ender_pearl();
if (printout == 6) hammer();
if (printout == 7) health_potion();
if (printout == 8) iron_sword();
if (printout == 9) trident();
if (printout == 10) lightning();
if (printout == 11) wind();
if (printout == 12) magic_helm();
if (printout == 13) fire();
if (printout == 14) jump_back();
if (printout == 15) iron_helm();
if (printout == 16) iron_shield();
if (printout == 17) iron_mail();
if (printout == 18) wall();
  
// 1 to get one of each known chip.
// 2 to get 10 blank weapon chips, also useful as status effect 
//   markers.
// 3 to get 10 blank armor chips.
printout = 16;

// If true, we'll render just the 2D symbols. This is
// useful for producing a PNG to print in the guide.
$flat = false;
